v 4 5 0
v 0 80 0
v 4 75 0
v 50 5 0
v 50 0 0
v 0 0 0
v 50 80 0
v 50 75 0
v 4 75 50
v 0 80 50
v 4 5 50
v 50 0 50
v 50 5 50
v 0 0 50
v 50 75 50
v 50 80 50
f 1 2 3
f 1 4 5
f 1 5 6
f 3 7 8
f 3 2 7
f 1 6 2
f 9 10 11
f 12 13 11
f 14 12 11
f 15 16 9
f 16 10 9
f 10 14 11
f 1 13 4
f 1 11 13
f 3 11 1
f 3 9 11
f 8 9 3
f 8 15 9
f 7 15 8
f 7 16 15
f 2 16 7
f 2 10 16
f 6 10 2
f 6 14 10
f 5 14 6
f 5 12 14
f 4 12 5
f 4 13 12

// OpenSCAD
$fn = 32;

// ----------------------------------------------------------------------
// Structural section: channel 50 x 80 mm
// ----------------------------------------------------------------------

// --- parameters (mm) ---
sec_w = 50;               // channel width, X
sec_h = 80;               // channel height, Y
flange_t = 5;             // flange thickness
web_t = 4;                // web thickness
plate_t = 50;             // cut length, Z (extrusion height)

profile = [[0, 0], [50, 0], [50, 5], [4, 5], [4, 75], [50, 75], [50, 80], [0, 80]];  // primary outline, 8 points, counter clockwise

// --- the one profile operation ---
linear_extrude(height = plate_t) polygon(points = profile);
